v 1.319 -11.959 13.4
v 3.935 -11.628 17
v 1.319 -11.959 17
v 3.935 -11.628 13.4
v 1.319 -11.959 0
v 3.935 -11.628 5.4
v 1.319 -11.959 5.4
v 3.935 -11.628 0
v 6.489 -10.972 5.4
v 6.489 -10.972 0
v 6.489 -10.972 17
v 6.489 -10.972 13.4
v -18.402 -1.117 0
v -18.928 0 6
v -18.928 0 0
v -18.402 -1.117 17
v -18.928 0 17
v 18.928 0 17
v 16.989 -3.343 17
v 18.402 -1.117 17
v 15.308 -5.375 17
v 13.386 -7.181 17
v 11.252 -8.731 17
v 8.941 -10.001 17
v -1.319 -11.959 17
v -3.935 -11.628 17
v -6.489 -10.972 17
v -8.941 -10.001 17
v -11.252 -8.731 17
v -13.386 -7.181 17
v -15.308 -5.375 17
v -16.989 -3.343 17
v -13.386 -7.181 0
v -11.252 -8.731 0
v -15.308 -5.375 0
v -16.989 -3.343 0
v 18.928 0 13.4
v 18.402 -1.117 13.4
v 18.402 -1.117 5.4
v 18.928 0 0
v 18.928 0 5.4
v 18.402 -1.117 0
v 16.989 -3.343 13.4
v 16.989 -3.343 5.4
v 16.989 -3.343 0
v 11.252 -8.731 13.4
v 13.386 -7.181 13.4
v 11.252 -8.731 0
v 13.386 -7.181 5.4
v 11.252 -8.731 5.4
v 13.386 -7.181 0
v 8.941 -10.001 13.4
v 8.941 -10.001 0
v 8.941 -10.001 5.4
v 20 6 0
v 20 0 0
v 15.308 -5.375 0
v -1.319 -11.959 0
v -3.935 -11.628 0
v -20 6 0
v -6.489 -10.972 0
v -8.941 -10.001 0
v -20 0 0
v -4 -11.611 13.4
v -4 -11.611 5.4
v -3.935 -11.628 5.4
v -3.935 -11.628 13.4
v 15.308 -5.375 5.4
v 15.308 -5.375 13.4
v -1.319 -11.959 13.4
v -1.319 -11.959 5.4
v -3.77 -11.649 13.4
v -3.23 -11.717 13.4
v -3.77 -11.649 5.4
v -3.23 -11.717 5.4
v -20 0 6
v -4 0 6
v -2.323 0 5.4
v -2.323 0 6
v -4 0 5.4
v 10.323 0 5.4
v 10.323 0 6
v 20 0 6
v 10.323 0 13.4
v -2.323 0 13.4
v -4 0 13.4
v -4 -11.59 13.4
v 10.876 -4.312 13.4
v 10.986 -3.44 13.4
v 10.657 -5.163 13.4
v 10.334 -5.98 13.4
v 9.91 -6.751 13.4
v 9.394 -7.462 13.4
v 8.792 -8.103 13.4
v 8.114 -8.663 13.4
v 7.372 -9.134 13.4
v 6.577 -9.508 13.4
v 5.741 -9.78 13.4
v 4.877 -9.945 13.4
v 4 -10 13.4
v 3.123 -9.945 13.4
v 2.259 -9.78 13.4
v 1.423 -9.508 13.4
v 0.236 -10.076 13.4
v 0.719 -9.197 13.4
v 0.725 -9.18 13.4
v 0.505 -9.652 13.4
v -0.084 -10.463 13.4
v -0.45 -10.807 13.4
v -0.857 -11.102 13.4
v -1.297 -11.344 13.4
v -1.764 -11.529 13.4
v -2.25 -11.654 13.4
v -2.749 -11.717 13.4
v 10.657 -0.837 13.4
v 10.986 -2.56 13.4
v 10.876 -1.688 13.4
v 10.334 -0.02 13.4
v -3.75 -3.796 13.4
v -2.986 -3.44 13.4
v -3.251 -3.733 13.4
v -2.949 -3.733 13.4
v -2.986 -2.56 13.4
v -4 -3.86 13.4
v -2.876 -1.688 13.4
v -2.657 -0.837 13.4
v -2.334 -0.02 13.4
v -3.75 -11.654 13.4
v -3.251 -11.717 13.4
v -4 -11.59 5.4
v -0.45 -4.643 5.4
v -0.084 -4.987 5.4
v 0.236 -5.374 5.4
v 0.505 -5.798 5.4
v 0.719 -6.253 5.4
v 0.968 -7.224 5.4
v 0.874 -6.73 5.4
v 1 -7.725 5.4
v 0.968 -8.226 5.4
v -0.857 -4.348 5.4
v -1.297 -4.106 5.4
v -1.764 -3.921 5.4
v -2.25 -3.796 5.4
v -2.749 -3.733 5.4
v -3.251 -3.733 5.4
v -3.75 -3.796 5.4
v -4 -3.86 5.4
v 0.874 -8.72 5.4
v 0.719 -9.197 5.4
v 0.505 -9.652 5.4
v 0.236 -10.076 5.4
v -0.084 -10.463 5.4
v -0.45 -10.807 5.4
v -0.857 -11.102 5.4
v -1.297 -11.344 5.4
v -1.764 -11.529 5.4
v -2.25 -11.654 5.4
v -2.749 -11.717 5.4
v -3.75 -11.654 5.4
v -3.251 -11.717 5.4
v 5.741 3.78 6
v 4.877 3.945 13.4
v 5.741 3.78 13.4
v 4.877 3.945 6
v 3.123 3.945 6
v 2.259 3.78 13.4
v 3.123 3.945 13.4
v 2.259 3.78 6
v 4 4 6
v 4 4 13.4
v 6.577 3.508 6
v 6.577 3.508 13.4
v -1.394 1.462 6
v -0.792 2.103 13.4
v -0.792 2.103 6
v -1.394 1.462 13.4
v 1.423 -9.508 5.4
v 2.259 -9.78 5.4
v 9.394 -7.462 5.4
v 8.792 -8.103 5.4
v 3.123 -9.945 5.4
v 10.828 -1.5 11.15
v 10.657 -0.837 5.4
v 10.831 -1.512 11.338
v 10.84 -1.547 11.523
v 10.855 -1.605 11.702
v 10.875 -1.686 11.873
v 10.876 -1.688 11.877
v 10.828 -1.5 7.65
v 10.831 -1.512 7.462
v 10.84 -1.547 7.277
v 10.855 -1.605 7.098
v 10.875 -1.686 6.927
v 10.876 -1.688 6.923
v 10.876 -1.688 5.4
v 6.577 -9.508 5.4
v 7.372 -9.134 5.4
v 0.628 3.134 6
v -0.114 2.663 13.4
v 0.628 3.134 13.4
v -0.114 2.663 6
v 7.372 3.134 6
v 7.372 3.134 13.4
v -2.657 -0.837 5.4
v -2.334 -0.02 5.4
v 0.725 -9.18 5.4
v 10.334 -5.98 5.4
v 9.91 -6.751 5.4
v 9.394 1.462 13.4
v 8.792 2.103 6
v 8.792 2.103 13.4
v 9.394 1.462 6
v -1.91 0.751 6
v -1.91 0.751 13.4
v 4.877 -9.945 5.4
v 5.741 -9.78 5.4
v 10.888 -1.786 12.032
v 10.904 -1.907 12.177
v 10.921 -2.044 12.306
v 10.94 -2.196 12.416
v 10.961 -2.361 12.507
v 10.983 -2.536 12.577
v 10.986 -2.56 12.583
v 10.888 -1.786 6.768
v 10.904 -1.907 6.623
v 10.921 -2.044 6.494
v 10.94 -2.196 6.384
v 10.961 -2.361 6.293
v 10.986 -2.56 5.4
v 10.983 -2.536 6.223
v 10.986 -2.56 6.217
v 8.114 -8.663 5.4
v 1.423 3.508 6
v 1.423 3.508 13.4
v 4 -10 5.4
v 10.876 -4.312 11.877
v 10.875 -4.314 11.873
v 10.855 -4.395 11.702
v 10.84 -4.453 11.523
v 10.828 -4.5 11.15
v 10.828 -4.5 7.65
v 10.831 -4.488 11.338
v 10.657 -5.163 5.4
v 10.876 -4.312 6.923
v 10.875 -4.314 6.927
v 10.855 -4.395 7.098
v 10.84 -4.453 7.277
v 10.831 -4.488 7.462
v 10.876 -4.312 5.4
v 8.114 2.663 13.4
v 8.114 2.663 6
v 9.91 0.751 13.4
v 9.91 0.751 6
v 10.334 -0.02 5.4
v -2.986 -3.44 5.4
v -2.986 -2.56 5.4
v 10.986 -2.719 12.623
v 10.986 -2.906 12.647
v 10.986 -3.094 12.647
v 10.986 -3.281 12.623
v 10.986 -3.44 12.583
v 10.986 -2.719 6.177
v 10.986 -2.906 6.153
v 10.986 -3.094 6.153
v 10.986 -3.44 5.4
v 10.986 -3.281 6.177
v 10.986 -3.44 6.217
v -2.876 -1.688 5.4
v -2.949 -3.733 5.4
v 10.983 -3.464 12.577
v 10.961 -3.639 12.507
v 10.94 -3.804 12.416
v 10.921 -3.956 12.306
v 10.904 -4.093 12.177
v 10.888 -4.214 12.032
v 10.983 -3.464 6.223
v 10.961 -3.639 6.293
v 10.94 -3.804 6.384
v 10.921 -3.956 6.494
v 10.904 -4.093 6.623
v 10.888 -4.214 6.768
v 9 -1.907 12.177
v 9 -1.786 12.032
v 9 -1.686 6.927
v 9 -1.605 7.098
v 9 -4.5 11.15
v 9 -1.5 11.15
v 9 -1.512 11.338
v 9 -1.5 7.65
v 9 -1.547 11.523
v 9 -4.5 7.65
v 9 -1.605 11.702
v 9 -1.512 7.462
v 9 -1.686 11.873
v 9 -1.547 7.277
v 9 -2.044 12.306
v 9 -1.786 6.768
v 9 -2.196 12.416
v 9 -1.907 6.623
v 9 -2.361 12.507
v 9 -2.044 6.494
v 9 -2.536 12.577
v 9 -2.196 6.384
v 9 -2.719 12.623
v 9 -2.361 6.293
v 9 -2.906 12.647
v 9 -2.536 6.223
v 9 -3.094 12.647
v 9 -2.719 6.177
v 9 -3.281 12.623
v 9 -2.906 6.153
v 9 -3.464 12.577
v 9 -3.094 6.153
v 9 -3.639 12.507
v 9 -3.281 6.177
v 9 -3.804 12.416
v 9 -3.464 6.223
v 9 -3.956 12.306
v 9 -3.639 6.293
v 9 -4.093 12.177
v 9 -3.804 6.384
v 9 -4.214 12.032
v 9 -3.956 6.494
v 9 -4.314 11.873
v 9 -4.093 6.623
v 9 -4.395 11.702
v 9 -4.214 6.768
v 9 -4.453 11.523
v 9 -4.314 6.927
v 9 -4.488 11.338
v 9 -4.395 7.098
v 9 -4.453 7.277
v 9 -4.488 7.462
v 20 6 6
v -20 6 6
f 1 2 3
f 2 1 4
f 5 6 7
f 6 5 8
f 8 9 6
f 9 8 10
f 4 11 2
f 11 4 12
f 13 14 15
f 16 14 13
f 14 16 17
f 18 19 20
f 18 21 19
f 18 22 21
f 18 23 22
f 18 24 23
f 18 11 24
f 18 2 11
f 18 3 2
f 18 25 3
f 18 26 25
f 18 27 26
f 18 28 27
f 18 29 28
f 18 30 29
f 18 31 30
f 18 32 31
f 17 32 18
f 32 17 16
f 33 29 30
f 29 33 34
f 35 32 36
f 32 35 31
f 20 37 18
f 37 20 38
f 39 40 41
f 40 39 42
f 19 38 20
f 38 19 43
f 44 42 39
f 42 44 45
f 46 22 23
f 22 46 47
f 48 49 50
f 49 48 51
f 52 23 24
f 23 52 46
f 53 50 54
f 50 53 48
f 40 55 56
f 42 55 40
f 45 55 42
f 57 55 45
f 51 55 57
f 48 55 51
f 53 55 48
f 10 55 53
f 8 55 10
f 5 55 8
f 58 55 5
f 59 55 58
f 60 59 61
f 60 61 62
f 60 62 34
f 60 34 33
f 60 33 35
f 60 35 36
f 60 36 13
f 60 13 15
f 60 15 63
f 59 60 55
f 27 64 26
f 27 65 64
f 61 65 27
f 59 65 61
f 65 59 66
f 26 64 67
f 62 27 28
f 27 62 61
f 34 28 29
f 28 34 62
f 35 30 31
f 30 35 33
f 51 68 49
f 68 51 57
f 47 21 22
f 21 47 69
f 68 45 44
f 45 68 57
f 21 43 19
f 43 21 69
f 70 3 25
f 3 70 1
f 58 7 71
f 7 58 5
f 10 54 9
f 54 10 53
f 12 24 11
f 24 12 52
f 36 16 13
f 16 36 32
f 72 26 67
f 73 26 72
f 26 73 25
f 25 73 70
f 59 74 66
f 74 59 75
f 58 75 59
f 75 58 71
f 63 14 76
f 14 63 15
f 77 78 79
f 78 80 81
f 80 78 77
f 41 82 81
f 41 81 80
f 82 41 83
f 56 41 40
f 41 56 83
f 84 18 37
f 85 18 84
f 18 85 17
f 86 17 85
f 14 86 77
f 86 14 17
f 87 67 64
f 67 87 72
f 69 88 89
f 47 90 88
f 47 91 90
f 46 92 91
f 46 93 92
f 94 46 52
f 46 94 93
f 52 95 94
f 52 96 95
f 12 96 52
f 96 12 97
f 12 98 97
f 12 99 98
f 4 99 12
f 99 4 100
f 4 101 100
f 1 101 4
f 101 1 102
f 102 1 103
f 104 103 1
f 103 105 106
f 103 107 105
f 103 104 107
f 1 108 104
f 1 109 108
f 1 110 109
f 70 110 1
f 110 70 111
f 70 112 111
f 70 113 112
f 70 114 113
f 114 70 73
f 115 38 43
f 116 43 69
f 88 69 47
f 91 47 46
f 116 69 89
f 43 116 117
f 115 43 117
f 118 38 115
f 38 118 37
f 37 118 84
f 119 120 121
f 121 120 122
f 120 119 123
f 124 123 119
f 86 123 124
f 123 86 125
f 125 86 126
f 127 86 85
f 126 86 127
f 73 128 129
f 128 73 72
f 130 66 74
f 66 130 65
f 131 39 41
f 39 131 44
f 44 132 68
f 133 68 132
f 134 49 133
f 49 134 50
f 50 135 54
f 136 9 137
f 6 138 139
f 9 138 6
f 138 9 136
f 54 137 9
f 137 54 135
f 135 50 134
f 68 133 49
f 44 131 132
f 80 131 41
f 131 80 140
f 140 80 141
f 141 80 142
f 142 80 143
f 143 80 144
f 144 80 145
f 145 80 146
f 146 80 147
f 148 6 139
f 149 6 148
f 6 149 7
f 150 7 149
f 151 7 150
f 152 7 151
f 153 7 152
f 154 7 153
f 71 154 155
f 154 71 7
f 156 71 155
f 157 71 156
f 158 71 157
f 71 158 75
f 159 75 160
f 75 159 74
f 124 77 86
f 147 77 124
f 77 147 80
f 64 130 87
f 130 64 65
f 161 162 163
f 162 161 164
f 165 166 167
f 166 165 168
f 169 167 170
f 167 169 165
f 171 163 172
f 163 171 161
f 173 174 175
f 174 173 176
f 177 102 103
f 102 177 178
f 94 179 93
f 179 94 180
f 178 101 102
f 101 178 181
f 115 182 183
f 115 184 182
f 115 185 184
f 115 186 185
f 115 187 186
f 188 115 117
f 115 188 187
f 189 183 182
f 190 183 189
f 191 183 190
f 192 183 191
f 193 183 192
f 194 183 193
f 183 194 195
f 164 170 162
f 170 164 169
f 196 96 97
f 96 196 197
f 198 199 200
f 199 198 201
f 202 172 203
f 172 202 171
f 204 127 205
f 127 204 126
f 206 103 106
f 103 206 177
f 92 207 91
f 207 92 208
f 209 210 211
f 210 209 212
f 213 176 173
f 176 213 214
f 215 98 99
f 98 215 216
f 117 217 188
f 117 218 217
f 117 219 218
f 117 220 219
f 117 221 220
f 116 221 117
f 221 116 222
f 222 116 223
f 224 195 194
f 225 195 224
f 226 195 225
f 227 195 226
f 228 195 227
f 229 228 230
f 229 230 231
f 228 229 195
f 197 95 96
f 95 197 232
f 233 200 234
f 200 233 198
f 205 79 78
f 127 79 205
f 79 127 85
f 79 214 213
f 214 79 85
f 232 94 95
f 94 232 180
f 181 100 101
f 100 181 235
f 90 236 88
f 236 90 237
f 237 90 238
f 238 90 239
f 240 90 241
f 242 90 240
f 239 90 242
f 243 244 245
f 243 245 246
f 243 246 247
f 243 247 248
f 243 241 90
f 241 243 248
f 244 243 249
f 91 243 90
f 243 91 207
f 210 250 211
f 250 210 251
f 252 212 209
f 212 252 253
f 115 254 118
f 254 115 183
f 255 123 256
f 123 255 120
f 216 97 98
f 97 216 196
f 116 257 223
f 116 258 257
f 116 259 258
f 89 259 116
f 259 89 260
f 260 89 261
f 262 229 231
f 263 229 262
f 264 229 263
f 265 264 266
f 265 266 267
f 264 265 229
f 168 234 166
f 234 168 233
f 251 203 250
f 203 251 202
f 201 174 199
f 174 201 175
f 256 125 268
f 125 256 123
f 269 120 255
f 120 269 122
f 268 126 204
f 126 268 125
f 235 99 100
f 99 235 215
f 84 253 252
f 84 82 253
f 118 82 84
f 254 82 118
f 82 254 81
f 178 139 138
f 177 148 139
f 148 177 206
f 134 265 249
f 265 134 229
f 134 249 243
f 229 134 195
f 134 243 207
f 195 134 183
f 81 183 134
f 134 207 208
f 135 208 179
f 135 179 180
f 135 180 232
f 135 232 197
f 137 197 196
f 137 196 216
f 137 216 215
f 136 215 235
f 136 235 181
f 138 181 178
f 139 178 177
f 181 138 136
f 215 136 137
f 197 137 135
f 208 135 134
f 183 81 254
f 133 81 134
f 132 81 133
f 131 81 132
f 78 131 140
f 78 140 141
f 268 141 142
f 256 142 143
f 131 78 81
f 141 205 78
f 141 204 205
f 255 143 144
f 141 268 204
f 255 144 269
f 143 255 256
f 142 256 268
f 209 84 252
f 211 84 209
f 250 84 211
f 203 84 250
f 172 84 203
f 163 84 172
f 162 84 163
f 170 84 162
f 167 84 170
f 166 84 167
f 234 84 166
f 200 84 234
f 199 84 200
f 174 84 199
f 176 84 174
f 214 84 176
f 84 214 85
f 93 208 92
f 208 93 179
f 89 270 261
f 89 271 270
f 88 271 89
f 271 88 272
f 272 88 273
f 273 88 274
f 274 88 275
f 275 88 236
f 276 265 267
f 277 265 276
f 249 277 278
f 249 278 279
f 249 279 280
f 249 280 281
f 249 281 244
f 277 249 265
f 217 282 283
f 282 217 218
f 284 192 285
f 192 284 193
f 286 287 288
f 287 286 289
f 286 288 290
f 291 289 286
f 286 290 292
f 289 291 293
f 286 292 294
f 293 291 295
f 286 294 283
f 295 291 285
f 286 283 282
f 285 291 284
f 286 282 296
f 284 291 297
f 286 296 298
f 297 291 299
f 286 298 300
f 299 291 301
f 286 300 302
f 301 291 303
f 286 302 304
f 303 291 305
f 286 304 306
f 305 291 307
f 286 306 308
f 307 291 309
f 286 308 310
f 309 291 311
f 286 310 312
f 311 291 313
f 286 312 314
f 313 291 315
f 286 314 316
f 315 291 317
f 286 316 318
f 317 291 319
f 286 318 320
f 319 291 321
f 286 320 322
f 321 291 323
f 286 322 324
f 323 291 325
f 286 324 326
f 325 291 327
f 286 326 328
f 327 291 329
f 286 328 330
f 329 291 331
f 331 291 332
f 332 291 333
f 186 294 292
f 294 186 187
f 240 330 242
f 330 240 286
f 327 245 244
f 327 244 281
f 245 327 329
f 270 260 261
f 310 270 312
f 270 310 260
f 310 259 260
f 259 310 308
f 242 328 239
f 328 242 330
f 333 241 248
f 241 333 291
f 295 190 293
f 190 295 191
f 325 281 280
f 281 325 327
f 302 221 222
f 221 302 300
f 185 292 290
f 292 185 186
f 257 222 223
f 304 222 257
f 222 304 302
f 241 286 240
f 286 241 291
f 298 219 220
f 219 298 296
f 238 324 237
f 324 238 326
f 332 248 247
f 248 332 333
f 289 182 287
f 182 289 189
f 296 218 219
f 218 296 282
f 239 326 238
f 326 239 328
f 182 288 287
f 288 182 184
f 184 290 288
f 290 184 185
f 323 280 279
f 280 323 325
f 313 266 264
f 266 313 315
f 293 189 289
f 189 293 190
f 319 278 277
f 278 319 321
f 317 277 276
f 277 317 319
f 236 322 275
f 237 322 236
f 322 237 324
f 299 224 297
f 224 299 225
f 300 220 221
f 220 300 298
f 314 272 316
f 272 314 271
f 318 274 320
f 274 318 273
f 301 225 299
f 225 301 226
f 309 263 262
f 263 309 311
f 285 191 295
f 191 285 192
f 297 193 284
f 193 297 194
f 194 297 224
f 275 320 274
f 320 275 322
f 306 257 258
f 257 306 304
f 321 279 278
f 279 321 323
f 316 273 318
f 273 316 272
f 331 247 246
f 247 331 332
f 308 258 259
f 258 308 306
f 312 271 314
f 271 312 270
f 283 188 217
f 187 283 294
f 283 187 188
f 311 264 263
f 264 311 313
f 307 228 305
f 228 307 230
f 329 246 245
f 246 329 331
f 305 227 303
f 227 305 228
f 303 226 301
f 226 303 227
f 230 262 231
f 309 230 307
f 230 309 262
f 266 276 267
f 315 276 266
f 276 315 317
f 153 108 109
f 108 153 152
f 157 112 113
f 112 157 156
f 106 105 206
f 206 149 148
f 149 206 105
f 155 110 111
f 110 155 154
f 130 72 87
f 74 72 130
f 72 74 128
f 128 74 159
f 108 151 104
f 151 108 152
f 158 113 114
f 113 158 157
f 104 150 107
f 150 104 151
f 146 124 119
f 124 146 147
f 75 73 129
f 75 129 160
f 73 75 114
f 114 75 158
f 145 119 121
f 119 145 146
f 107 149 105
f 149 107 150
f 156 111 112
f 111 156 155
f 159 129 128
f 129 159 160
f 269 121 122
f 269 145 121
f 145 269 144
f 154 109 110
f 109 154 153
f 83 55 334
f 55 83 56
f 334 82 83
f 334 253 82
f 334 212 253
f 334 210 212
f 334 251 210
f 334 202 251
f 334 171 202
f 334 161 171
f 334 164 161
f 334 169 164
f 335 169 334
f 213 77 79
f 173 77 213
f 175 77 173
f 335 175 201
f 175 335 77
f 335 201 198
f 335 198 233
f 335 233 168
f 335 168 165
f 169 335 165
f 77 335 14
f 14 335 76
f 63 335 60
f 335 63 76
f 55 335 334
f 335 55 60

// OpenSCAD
$fn=50;
face_r = 21;
face_h = 17;
face_depth = 12;

slot_h = 8;
slot_below = (face_h - slot_h) * 3 / 5;
slot_offset = 4;
slot_r = slot_offset;
slot_y_fudge = 0.275;
slot_x_fudge = 1;

shield_r = 7;
shield_x = 4;
shield_y = -3;

barrel_slot_w = 3;
// distance from top of slot to top of shield
barrel_slot_offest = 0.75;
barrel_slot_depth = 2;

module face() {
	difference() {
		translate([0,face_r - face_depth,0]) {cylinder(r = face_r, h = face_h);}
		translate([-face_r,0,0])  {cube(face_r * 2, face_r + 1, face_h + 1);}
		slot();
	}
}

module slot() {
	translate([-slot_offset,-face_r,slot_below]) {cube([face_r*2, face_r*2, slot_h]);}
}

module slotcurve() {
	translate([-slot_offset+slot_x_fudge,-(face_depth-slot_r)+slot_y_fudge,slot_below]) {
		cylinder(r = slot_r, h = slot_h);
		}
}

module shield() {
	translate([shield_x,shield_y,slot_below]) {
		rotate([0,0,90]) {
			difference() {
				cylinder(r = shield_r, h = slot_h);
				barrelslot();
			}
		}
	}
}	

module barrelslot() {
	translate([0,- shield_r,barrel_slot_w /2 + barrel_slot_offest]) {
		hull() {
			rotate([-90,0,0]) { cylinder(r = barrel_slot_w /2, h = barrel_slot_depth); }
			translate([0,0,slot_h - 2*barrel_slot_offest - barrel_slot_w ]) {rotate([-90,0,0]) { cylinder(r = barrel_slot_w /2, h = barrel_slot_depth); }}
		}
	}
}

module measure() {
	translate([-20,0,0]) {
		cube([40,6,6]);
	}
}

module barbette() {
	union() {
		face();
		slotcurve();
		shield();
		measure();
	}
}

barbette();
//barrelslot();
